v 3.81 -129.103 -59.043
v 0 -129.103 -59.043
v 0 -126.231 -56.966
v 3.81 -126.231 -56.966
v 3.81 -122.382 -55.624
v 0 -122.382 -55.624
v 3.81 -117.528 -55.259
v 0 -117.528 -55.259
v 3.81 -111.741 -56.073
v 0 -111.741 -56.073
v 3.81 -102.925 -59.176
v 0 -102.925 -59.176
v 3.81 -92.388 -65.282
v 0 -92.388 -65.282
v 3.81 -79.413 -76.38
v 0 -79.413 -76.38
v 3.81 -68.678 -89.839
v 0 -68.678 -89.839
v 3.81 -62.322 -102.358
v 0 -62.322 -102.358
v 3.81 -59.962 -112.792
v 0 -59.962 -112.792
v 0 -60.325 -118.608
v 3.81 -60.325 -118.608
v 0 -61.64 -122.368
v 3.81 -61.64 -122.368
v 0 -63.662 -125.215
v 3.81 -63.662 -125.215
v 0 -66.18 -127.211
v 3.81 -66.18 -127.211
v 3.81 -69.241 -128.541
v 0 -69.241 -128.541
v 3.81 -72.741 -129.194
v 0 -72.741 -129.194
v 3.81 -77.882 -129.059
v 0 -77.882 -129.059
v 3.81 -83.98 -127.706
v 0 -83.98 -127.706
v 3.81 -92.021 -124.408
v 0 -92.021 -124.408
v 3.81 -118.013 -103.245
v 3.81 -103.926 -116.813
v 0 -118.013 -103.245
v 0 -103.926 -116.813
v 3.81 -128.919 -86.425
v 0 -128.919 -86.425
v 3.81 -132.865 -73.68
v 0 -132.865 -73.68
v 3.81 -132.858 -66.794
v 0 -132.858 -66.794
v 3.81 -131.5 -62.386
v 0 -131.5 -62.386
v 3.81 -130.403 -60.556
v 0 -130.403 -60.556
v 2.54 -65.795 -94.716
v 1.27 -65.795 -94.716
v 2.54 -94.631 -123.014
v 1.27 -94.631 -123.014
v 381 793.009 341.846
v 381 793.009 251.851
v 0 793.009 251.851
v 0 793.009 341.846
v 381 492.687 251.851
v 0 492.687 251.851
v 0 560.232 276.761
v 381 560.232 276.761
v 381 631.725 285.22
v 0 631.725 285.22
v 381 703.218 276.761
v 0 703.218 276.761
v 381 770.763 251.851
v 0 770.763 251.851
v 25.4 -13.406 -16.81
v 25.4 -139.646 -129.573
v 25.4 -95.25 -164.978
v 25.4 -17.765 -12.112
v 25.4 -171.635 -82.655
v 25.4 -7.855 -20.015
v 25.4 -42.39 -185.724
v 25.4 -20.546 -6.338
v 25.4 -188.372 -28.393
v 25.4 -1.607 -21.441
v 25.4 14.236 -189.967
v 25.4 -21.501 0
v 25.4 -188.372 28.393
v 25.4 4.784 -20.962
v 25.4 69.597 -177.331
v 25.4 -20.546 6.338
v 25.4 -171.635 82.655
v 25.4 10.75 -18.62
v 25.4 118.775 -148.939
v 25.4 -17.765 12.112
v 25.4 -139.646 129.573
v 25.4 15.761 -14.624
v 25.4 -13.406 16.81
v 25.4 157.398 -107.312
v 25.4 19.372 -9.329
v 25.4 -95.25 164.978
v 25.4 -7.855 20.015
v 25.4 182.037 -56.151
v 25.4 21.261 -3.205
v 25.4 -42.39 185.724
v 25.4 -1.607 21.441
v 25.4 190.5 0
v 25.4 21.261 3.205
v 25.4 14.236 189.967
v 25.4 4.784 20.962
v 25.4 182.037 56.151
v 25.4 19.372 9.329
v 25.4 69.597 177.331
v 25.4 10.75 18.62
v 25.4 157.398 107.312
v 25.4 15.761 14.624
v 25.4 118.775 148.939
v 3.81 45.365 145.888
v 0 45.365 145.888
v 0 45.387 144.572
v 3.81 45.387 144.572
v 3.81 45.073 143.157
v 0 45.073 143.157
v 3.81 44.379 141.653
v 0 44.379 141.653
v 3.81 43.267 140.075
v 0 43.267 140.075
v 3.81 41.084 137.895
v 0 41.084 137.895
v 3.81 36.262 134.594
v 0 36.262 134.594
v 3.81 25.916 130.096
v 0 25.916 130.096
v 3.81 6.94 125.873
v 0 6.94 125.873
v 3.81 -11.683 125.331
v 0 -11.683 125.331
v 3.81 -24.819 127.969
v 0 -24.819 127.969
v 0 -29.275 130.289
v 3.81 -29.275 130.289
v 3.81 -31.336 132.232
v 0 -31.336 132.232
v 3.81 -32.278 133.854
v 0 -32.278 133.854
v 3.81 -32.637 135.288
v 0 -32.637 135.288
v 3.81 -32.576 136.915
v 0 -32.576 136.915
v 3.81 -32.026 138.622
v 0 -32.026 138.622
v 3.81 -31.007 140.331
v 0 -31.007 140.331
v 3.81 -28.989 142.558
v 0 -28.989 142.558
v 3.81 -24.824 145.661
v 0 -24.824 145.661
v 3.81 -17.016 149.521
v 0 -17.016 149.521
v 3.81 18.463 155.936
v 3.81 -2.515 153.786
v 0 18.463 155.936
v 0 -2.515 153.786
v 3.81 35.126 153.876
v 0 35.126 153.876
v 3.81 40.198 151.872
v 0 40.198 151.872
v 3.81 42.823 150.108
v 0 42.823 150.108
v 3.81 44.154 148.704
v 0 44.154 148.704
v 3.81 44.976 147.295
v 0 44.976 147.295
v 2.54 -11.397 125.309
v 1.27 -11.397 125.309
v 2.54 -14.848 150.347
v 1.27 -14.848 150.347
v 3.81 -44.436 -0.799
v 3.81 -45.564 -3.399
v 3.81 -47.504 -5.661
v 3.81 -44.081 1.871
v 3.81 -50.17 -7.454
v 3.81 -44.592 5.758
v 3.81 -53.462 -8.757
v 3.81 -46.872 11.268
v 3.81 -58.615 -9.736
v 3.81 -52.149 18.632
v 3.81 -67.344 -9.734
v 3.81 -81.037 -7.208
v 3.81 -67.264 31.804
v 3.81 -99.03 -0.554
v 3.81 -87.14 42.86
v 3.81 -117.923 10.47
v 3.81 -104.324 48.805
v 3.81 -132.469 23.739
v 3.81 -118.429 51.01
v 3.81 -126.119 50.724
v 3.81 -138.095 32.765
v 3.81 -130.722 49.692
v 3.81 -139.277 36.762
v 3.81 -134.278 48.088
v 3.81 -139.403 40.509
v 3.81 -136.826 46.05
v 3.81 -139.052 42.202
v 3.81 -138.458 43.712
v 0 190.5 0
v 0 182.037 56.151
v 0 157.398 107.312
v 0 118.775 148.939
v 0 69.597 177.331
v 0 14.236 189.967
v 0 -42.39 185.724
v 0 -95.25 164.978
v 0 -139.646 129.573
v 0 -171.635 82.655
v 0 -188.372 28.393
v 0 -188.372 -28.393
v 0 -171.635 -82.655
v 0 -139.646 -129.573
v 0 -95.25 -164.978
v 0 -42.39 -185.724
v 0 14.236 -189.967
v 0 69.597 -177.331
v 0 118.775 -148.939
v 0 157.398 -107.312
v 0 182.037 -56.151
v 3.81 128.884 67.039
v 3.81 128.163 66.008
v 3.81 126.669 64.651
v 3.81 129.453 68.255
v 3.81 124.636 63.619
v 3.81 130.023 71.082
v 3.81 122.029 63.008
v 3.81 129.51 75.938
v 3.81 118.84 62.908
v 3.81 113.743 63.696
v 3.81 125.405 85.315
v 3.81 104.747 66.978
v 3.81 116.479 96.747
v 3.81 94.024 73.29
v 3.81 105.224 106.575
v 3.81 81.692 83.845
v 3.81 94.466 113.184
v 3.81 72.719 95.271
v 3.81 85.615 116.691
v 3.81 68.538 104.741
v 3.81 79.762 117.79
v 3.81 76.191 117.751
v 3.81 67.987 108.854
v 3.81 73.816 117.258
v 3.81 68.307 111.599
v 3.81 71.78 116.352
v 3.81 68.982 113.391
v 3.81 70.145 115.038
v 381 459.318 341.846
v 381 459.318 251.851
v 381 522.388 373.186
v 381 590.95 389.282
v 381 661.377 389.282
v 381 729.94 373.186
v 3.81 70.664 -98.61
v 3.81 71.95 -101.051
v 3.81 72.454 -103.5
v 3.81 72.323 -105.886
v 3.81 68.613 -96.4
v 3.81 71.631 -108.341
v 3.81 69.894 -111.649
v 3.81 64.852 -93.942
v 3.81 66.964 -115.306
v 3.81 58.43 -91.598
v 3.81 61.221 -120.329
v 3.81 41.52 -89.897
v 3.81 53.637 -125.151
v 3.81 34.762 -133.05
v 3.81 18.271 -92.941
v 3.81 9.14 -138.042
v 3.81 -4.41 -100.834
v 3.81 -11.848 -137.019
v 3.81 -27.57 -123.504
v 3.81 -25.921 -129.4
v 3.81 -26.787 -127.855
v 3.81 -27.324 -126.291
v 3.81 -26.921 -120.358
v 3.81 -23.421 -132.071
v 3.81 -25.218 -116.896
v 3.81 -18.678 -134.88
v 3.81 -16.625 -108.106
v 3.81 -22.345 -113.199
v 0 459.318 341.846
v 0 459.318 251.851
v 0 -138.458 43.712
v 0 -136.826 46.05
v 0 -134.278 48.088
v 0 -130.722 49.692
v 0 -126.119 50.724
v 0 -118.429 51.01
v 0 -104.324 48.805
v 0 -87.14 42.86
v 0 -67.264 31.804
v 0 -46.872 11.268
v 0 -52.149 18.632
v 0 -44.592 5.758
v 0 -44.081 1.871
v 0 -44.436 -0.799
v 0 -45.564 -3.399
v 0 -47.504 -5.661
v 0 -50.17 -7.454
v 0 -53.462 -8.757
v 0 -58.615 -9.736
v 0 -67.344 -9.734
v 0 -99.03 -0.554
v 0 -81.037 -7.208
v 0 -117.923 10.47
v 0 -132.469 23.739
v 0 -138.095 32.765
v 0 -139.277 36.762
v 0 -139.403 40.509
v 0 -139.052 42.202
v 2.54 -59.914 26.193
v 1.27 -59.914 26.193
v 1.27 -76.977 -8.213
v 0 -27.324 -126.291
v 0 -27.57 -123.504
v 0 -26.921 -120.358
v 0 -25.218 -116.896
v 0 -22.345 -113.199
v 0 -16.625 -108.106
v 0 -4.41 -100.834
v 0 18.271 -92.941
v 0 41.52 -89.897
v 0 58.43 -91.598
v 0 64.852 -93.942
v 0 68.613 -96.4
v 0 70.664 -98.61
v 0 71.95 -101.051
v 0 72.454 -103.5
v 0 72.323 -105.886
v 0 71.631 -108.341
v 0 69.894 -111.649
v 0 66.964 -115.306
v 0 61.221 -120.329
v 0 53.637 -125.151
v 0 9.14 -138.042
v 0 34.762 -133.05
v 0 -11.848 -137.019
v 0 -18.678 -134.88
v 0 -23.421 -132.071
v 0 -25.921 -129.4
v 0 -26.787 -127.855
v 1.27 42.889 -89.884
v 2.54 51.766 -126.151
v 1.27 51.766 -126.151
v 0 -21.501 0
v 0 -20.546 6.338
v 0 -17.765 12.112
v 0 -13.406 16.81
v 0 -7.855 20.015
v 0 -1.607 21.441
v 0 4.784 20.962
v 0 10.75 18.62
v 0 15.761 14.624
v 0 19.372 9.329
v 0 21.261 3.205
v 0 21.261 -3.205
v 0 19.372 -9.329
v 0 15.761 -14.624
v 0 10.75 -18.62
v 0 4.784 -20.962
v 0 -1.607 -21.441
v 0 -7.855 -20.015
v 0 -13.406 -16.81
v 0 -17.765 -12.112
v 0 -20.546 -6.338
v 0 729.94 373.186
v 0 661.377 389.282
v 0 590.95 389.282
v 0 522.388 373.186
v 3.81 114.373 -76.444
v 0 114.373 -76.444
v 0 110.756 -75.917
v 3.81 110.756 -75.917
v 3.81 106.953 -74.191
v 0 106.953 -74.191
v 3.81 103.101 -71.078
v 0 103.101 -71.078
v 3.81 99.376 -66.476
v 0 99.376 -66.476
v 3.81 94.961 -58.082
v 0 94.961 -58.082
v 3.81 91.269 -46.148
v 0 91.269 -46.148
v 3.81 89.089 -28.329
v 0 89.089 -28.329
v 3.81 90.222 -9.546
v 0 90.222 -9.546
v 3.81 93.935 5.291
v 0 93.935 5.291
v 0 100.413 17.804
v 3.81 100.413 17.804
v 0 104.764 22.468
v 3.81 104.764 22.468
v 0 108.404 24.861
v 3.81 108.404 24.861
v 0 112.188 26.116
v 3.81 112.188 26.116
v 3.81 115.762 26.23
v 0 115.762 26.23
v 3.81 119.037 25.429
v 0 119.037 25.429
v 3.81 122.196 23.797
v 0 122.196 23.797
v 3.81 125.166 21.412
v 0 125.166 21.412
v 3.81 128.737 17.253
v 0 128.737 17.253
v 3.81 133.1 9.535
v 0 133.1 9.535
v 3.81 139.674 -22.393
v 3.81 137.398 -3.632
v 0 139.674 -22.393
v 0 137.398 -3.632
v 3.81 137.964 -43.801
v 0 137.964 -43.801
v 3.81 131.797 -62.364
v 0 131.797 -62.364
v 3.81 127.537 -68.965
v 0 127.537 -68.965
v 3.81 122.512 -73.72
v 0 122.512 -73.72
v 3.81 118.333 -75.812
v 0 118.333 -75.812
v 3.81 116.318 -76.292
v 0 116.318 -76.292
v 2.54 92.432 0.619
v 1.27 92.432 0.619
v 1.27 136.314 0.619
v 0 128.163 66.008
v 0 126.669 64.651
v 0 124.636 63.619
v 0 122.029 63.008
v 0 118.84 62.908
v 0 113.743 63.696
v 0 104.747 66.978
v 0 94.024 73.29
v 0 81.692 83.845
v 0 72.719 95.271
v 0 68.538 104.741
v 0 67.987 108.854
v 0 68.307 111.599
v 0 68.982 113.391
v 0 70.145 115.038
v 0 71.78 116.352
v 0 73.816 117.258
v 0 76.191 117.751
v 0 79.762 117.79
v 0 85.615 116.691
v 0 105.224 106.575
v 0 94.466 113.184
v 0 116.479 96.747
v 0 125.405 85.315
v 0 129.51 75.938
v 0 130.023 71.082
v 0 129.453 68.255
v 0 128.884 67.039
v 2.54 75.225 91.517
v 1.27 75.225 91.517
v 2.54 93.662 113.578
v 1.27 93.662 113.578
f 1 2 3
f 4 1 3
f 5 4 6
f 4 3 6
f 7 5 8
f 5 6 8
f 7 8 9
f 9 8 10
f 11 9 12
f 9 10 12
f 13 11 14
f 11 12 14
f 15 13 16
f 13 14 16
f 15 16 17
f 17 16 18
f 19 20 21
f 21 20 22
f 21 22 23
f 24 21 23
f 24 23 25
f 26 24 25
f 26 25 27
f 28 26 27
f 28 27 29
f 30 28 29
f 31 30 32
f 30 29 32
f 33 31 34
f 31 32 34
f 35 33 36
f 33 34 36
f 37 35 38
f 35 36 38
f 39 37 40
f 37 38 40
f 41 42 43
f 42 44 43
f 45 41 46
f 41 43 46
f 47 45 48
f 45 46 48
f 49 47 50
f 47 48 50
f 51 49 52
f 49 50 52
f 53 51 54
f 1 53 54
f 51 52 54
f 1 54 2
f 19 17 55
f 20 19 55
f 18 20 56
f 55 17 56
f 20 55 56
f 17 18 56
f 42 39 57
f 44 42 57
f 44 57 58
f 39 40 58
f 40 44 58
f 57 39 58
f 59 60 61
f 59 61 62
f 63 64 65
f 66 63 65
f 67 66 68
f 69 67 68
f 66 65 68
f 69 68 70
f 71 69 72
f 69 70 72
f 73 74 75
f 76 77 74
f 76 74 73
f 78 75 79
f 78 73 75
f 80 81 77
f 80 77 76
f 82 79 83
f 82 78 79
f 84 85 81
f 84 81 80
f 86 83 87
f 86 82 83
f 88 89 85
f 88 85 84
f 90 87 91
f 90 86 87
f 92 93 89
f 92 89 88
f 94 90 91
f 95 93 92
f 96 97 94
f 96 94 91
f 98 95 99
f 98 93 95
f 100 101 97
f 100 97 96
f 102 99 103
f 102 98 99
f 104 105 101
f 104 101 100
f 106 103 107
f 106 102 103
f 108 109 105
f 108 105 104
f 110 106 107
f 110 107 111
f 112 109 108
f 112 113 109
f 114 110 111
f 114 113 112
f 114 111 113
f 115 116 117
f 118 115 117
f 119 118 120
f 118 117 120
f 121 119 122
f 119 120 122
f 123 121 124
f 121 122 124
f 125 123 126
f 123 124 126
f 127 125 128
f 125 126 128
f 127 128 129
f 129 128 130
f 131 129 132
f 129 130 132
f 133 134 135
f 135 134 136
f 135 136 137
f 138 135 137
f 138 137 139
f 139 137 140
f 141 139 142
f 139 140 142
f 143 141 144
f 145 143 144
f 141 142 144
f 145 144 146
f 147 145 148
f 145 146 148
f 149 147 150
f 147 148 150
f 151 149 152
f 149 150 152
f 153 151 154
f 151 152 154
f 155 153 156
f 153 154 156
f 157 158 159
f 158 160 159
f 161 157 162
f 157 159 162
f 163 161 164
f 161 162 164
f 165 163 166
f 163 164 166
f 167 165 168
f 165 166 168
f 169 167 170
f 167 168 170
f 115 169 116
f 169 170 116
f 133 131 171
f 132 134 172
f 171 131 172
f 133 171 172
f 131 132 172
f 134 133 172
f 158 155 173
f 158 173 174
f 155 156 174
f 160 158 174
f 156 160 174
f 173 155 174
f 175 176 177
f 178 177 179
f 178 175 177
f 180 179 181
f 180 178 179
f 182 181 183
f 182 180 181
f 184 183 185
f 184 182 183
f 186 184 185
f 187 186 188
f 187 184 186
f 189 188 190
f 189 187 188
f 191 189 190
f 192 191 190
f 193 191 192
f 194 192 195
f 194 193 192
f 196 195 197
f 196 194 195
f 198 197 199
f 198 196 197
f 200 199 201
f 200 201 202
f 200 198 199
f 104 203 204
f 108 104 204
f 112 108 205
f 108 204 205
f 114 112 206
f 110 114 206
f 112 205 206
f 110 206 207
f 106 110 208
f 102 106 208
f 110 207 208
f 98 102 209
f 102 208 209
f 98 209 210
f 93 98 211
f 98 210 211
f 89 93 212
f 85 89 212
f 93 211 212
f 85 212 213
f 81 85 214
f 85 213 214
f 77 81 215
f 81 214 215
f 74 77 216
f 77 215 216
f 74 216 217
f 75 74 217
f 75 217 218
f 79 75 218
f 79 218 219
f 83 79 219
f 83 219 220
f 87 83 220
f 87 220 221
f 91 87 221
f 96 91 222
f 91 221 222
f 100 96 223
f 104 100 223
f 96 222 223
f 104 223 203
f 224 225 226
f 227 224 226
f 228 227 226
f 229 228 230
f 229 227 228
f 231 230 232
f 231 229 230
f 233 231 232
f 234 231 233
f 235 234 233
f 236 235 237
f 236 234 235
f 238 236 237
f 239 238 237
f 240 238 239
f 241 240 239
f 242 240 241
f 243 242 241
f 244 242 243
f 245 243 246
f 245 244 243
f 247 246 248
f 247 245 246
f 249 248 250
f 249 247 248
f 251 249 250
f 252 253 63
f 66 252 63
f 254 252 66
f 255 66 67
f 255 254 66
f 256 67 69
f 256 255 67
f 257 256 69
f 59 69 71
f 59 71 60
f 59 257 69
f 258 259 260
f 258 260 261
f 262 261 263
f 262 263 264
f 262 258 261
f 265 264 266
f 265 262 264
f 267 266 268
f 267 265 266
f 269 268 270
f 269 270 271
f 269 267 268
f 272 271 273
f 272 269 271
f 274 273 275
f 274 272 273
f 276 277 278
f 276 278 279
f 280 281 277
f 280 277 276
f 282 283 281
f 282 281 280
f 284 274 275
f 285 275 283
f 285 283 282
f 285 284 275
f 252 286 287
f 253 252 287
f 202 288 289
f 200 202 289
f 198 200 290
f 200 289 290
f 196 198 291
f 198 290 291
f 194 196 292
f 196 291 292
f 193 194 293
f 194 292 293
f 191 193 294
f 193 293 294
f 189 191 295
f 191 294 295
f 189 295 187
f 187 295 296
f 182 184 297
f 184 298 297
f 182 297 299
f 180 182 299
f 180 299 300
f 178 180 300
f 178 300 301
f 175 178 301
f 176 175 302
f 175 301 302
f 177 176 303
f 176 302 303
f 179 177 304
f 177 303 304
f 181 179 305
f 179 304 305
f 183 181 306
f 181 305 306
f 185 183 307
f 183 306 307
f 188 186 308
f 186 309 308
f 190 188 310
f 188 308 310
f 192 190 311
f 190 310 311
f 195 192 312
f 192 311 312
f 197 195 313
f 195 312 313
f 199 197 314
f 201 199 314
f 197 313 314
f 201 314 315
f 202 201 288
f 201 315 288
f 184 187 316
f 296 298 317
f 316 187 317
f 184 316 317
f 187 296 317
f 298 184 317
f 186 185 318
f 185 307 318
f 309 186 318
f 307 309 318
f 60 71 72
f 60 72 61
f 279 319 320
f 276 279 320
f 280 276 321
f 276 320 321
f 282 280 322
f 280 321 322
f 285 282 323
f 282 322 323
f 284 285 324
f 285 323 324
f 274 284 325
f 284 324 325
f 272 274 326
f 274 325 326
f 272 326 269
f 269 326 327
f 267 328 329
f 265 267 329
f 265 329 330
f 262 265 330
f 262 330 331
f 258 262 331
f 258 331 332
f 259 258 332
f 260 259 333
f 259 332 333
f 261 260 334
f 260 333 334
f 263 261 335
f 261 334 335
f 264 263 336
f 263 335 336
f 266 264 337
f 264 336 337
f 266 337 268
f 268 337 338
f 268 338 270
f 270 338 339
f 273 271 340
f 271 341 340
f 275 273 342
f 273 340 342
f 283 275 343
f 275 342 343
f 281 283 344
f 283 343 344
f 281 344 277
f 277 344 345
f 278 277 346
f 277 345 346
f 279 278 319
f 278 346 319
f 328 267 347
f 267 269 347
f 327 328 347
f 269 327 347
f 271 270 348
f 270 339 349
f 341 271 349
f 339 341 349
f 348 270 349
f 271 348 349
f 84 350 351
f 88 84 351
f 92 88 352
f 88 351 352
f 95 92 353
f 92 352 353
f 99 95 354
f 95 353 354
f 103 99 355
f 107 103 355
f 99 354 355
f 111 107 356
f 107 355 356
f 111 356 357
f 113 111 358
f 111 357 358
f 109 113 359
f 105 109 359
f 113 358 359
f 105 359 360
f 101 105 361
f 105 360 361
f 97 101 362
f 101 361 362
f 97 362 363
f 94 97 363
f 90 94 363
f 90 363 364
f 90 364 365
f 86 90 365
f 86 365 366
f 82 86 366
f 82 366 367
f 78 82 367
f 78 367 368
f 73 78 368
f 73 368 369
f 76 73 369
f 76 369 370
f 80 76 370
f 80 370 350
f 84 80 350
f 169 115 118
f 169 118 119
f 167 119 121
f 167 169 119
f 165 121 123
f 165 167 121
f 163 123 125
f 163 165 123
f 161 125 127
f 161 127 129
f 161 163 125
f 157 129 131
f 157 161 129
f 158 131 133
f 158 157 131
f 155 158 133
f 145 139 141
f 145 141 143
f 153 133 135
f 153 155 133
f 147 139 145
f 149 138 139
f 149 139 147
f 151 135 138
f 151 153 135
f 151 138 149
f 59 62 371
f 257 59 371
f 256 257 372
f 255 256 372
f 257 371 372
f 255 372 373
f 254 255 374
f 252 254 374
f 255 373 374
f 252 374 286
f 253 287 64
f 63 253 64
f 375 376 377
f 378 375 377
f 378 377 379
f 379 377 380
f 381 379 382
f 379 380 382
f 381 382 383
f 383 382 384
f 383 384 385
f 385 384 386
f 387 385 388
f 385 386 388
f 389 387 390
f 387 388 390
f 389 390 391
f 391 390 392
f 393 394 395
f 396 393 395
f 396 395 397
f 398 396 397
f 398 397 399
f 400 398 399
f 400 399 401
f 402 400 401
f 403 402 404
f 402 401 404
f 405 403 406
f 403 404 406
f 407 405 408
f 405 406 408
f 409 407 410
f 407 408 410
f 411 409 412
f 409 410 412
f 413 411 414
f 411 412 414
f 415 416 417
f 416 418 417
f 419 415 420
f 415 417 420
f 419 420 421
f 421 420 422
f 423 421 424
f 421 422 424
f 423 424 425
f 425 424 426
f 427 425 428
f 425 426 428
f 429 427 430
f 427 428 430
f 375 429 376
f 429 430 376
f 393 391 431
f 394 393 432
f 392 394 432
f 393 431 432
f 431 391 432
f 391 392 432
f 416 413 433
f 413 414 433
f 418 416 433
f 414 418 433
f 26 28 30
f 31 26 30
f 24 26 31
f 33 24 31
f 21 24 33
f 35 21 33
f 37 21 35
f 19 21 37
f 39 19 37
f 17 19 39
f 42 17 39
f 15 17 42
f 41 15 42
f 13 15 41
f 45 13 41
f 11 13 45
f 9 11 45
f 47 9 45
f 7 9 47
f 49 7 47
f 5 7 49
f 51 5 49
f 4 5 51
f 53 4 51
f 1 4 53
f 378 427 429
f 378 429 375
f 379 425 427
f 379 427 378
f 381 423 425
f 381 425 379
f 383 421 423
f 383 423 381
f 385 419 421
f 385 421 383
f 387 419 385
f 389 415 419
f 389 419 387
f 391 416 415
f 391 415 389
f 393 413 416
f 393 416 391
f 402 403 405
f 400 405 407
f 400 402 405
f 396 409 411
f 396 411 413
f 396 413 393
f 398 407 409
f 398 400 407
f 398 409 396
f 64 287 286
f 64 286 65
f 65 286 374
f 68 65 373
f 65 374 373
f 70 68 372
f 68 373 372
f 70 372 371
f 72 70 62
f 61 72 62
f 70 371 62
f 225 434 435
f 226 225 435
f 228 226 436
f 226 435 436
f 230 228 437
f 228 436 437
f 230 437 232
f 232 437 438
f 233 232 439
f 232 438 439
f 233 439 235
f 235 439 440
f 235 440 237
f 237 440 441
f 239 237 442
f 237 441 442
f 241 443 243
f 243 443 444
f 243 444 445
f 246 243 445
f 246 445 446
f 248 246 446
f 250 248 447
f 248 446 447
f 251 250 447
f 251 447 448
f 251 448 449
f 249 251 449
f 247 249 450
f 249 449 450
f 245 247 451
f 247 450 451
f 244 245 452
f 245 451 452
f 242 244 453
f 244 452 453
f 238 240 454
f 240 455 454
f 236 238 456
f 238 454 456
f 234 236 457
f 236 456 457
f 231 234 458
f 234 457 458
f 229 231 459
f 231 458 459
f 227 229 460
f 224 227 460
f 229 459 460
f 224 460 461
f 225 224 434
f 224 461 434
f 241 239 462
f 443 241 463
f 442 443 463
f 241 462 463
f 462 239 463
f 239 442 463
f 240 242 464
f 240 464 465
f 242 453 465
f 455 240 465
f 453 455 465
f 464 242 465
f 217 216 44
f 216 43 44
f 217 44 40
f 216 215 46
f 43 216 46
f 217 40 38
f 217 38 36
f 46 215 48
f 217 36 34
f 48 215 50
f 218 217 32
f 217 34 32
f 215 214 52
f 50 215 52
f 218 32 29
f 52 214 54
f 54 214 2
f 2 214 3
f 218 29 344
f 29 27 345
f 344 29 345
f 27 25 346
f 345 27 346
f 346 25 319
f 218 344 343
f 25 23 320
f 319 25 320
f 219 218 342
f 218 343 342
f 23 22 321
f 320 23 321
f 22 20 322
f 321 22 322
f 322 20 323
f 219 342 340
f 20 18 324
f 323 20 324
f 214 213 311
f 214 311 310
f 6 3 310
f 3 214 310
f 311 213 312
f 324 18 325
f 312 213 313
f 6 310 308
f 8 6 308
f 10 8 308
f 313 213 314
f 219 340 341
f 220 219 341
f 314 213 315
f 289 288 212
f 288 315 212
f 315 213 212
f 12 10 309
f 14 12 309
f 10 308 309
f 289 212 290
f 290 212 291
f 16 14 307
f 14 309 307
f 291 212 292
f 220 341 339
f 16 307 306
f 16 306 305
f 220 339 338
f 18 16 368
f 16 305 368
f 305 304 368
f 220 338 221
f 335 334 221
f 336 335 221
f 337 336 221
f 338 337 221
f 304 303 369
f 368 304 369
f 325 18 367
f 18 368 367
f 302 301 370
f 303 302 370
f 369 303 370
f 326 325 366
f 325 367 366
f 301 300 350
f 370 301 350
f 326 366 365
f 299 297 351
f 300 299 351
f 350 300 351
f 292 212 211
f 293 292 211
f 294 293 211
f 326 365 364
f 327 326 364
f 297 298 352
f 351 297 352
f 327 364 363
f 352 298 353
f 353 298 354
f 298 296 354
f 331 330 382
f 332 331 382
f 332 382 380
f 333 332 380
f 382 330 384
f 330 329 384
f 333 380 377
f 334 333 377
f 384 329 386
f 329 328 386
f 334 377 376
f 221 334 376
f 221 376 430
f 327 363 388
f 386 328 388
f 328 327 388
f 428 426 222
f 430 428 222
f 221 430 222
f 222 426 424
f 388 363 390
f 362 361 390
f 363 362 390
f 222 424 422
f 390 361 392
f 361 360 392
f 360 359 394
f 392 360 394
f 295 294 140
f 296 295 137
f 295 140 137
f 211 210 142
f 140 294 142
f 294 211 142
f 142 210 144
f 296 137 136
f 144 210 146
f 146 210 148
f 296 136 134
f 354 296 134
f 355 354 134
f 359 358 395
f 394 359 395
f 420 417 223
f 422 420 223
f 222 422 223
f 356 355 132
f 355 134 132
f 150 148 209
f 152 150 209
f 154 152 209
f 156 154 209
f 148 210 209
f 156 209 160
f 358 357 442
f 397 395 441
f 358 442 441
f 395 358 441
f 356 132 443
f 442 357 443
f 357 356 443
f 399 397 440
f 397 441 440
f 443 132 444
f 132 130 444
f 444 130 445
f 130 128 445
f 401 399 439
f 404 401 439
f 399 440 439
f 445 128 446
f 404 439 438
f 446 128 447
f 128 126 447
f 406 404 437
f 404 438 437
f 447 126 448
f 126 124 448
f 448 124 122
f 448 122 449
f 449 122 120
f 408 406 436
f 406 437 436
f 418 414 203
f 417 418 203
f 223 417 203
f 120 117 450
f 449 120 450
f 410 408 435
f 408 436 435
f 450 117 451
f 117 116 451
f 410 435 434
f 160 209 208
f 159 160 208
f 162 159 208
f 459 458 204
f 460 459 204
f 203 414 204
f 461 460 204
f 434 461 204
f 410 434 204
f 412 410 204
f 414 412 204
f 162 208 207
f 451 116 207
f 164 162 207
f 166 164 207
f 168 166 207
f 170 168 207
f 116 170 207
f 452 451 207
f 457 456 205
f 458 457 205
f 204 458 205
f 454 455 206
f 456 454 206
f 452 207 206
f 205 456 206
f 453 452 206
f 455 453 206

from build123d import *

# Parameters (mm, degrees)
F0_R     = 190.5
F1_DEPTH = 25.4
F2_R     = 21.500938
F3_DEPTH = 72.644
F5_DEPTH = 3.81
F7_DEPTH = 381


with BuildPart() as f1:
    # F0 (on Right) → F1 (new body)
    with BuildSketch(Plane.YZ):
        Circle(F0_R)
    extrude(amount=F1_DEPTH)

    # F2 (on face) → F3 (cut)
    with BuildSketch(Plane(origin=(0, 0, 0), x_dir=(0, -1, 0), z_dir=(-1, 0, 0))):
        Circle(F2_R)
    extrude(amount=-F3_DEPTH, mode=Mode.SUBTRACT)

    # F4 (on face) → F5 (cut)
    with BuildSketch(Plane(origin=(0, 0, 0), x_dir=(0, -1, 0), z_dir=(-1, 0, 0))):
        with BuildLine():
            add(Edge.make_bspline(
                [(-45.365423, 145.888194), (-48.815764, 120.850164), (11.397403, 125.309298), (71.610569, 129.768431), (14.847744, 150.347328), (-41.915081, 170.926225), (-45.365423, 145.888194)],
                knots=[0, 0, 0, 2.094395, 2.094395, 4.18879, 4.18879, 6.283185, 6.283185, 6.283185], degree=2, weights=[1, 0.5, 1, 0.5, 1, 0.5, 1]))
        make_face()
        with BuildLine():
            add(Edge.make_bspline(
                [(-128.163308, 66.008151), (-109.725582, 43.947306), (-75.224617, 91.517316), (-40.723652, 139.087327), (-93.662343, 113.578161), (-146.601033, 88.068996), (-128.163308, 66.008151)],
                knots=[0, 0, 0, 2.094395, 2.094395, 4.18879, 4.18879, 6.283185, 6.283185, 6.283185], degree=2, weights=[1, 0.5, 1, 0.5, 1, 0.5, 1]))
        make_face()
        with BuildLine():
            add(Edge.make_bspline(
                [(-114.373267, -76.443866), (-70.491691, -76.443866), (-92.432479, 0.619436), (-114.373267, 77.682737), (-136.314055, 0.619436), (-158.254842, -76.443866), (-114.373267, -76.443866)],
                knots=[0, 0, 0, 2.094395, 2.094395, 4.18879, 4.18879, 6.283185, 6.283185, 6.283185], degree=2, weights=[1, 0.5, 1, 0.5, 1, 0.5, 1]))
        make_face()
        with BuildLine():
            add(Edge.make_bspline(
                [(27.323976, -126.290634), (36.201424, -90.023326), (-42.888849, -89.883906), (-121.979121, -89.744486), (-51.766296, -126.151214), (18.446529, -162.557942), (27.323976, -126.290634)],
                knots=[0, 0, 0, 2.094395, 2.094395, 4.18879, 4.18879, 6.283185, 6.283185, 6.283185], degree=2, weights=[1, 0.5, 1, 0.5, 1, 0.5, 1]))
        make_face()
        with BuildLine():
            add(Edge.make_bspline(
                [(129.103094, -59.043366), (100.266461, -30.745903), (65.794589, -94.71636), (31.322718, -158.686817), (94.631223, -123.013823), (157.939728, -87.34083), (129.103094, -59.043366)],
                knots=[0, 0, 0, 2.094395, 2.094395, 4.18879, 4.18879, 6.283185, 6.283185, 6.283185], degree=2, weights=[1, 0.5, 1, 0.5, 1, 0.5, 1]))
        make_face()
        with BuildLine():
            add(Edge.make_bspline(
                [(138.45779, 43.711629), (121.394792, 78.117723), (59.913886, 26.193458), (-1.567021, -25.730807), (76.976883, -8.212637), (155.520788, 9.305534), (138.45779, 43.711629)],
                knots=[0, 0, 0, 2.094395, 2.094395, 4.18879, 4.18879, 6.283185, 6.283185, 6.283185], degree=2, weights=[1, 0.5, 1, 0.5, 1, 0.5, 1]))
        make_face()
    extrude(amount=-F5_DEPTH, mode=Mode.SUBTRACT)


with BuildPart() as f7:
    # F6 (on Right) → F7 (new body)
    with BuildSketch(Plane.YZ):
        with BuildLine():
            ThreePointArc((793.009055, 341.84617), (626.163647, 391.314494), (459.318238, 341.84617))
            Line((459.318238, 341.84617), (459.318238, 251.850771))
            Line((459.318238, 251.850771), (492.687314, 251.850771))
            ThreePointArc((492.687314, 251.850771), (631.725153, 285.220274), (770.762991, 251.850771))
            Line((770.762991, 251.850771), (793.009055, 251.850771))
            Line((793.009055, 251.850771), (793.009055, 341.84617))
        make_face()
    extrude(amount=F7_DEPTH)


solid = Compound([f1.part, f7.part])
